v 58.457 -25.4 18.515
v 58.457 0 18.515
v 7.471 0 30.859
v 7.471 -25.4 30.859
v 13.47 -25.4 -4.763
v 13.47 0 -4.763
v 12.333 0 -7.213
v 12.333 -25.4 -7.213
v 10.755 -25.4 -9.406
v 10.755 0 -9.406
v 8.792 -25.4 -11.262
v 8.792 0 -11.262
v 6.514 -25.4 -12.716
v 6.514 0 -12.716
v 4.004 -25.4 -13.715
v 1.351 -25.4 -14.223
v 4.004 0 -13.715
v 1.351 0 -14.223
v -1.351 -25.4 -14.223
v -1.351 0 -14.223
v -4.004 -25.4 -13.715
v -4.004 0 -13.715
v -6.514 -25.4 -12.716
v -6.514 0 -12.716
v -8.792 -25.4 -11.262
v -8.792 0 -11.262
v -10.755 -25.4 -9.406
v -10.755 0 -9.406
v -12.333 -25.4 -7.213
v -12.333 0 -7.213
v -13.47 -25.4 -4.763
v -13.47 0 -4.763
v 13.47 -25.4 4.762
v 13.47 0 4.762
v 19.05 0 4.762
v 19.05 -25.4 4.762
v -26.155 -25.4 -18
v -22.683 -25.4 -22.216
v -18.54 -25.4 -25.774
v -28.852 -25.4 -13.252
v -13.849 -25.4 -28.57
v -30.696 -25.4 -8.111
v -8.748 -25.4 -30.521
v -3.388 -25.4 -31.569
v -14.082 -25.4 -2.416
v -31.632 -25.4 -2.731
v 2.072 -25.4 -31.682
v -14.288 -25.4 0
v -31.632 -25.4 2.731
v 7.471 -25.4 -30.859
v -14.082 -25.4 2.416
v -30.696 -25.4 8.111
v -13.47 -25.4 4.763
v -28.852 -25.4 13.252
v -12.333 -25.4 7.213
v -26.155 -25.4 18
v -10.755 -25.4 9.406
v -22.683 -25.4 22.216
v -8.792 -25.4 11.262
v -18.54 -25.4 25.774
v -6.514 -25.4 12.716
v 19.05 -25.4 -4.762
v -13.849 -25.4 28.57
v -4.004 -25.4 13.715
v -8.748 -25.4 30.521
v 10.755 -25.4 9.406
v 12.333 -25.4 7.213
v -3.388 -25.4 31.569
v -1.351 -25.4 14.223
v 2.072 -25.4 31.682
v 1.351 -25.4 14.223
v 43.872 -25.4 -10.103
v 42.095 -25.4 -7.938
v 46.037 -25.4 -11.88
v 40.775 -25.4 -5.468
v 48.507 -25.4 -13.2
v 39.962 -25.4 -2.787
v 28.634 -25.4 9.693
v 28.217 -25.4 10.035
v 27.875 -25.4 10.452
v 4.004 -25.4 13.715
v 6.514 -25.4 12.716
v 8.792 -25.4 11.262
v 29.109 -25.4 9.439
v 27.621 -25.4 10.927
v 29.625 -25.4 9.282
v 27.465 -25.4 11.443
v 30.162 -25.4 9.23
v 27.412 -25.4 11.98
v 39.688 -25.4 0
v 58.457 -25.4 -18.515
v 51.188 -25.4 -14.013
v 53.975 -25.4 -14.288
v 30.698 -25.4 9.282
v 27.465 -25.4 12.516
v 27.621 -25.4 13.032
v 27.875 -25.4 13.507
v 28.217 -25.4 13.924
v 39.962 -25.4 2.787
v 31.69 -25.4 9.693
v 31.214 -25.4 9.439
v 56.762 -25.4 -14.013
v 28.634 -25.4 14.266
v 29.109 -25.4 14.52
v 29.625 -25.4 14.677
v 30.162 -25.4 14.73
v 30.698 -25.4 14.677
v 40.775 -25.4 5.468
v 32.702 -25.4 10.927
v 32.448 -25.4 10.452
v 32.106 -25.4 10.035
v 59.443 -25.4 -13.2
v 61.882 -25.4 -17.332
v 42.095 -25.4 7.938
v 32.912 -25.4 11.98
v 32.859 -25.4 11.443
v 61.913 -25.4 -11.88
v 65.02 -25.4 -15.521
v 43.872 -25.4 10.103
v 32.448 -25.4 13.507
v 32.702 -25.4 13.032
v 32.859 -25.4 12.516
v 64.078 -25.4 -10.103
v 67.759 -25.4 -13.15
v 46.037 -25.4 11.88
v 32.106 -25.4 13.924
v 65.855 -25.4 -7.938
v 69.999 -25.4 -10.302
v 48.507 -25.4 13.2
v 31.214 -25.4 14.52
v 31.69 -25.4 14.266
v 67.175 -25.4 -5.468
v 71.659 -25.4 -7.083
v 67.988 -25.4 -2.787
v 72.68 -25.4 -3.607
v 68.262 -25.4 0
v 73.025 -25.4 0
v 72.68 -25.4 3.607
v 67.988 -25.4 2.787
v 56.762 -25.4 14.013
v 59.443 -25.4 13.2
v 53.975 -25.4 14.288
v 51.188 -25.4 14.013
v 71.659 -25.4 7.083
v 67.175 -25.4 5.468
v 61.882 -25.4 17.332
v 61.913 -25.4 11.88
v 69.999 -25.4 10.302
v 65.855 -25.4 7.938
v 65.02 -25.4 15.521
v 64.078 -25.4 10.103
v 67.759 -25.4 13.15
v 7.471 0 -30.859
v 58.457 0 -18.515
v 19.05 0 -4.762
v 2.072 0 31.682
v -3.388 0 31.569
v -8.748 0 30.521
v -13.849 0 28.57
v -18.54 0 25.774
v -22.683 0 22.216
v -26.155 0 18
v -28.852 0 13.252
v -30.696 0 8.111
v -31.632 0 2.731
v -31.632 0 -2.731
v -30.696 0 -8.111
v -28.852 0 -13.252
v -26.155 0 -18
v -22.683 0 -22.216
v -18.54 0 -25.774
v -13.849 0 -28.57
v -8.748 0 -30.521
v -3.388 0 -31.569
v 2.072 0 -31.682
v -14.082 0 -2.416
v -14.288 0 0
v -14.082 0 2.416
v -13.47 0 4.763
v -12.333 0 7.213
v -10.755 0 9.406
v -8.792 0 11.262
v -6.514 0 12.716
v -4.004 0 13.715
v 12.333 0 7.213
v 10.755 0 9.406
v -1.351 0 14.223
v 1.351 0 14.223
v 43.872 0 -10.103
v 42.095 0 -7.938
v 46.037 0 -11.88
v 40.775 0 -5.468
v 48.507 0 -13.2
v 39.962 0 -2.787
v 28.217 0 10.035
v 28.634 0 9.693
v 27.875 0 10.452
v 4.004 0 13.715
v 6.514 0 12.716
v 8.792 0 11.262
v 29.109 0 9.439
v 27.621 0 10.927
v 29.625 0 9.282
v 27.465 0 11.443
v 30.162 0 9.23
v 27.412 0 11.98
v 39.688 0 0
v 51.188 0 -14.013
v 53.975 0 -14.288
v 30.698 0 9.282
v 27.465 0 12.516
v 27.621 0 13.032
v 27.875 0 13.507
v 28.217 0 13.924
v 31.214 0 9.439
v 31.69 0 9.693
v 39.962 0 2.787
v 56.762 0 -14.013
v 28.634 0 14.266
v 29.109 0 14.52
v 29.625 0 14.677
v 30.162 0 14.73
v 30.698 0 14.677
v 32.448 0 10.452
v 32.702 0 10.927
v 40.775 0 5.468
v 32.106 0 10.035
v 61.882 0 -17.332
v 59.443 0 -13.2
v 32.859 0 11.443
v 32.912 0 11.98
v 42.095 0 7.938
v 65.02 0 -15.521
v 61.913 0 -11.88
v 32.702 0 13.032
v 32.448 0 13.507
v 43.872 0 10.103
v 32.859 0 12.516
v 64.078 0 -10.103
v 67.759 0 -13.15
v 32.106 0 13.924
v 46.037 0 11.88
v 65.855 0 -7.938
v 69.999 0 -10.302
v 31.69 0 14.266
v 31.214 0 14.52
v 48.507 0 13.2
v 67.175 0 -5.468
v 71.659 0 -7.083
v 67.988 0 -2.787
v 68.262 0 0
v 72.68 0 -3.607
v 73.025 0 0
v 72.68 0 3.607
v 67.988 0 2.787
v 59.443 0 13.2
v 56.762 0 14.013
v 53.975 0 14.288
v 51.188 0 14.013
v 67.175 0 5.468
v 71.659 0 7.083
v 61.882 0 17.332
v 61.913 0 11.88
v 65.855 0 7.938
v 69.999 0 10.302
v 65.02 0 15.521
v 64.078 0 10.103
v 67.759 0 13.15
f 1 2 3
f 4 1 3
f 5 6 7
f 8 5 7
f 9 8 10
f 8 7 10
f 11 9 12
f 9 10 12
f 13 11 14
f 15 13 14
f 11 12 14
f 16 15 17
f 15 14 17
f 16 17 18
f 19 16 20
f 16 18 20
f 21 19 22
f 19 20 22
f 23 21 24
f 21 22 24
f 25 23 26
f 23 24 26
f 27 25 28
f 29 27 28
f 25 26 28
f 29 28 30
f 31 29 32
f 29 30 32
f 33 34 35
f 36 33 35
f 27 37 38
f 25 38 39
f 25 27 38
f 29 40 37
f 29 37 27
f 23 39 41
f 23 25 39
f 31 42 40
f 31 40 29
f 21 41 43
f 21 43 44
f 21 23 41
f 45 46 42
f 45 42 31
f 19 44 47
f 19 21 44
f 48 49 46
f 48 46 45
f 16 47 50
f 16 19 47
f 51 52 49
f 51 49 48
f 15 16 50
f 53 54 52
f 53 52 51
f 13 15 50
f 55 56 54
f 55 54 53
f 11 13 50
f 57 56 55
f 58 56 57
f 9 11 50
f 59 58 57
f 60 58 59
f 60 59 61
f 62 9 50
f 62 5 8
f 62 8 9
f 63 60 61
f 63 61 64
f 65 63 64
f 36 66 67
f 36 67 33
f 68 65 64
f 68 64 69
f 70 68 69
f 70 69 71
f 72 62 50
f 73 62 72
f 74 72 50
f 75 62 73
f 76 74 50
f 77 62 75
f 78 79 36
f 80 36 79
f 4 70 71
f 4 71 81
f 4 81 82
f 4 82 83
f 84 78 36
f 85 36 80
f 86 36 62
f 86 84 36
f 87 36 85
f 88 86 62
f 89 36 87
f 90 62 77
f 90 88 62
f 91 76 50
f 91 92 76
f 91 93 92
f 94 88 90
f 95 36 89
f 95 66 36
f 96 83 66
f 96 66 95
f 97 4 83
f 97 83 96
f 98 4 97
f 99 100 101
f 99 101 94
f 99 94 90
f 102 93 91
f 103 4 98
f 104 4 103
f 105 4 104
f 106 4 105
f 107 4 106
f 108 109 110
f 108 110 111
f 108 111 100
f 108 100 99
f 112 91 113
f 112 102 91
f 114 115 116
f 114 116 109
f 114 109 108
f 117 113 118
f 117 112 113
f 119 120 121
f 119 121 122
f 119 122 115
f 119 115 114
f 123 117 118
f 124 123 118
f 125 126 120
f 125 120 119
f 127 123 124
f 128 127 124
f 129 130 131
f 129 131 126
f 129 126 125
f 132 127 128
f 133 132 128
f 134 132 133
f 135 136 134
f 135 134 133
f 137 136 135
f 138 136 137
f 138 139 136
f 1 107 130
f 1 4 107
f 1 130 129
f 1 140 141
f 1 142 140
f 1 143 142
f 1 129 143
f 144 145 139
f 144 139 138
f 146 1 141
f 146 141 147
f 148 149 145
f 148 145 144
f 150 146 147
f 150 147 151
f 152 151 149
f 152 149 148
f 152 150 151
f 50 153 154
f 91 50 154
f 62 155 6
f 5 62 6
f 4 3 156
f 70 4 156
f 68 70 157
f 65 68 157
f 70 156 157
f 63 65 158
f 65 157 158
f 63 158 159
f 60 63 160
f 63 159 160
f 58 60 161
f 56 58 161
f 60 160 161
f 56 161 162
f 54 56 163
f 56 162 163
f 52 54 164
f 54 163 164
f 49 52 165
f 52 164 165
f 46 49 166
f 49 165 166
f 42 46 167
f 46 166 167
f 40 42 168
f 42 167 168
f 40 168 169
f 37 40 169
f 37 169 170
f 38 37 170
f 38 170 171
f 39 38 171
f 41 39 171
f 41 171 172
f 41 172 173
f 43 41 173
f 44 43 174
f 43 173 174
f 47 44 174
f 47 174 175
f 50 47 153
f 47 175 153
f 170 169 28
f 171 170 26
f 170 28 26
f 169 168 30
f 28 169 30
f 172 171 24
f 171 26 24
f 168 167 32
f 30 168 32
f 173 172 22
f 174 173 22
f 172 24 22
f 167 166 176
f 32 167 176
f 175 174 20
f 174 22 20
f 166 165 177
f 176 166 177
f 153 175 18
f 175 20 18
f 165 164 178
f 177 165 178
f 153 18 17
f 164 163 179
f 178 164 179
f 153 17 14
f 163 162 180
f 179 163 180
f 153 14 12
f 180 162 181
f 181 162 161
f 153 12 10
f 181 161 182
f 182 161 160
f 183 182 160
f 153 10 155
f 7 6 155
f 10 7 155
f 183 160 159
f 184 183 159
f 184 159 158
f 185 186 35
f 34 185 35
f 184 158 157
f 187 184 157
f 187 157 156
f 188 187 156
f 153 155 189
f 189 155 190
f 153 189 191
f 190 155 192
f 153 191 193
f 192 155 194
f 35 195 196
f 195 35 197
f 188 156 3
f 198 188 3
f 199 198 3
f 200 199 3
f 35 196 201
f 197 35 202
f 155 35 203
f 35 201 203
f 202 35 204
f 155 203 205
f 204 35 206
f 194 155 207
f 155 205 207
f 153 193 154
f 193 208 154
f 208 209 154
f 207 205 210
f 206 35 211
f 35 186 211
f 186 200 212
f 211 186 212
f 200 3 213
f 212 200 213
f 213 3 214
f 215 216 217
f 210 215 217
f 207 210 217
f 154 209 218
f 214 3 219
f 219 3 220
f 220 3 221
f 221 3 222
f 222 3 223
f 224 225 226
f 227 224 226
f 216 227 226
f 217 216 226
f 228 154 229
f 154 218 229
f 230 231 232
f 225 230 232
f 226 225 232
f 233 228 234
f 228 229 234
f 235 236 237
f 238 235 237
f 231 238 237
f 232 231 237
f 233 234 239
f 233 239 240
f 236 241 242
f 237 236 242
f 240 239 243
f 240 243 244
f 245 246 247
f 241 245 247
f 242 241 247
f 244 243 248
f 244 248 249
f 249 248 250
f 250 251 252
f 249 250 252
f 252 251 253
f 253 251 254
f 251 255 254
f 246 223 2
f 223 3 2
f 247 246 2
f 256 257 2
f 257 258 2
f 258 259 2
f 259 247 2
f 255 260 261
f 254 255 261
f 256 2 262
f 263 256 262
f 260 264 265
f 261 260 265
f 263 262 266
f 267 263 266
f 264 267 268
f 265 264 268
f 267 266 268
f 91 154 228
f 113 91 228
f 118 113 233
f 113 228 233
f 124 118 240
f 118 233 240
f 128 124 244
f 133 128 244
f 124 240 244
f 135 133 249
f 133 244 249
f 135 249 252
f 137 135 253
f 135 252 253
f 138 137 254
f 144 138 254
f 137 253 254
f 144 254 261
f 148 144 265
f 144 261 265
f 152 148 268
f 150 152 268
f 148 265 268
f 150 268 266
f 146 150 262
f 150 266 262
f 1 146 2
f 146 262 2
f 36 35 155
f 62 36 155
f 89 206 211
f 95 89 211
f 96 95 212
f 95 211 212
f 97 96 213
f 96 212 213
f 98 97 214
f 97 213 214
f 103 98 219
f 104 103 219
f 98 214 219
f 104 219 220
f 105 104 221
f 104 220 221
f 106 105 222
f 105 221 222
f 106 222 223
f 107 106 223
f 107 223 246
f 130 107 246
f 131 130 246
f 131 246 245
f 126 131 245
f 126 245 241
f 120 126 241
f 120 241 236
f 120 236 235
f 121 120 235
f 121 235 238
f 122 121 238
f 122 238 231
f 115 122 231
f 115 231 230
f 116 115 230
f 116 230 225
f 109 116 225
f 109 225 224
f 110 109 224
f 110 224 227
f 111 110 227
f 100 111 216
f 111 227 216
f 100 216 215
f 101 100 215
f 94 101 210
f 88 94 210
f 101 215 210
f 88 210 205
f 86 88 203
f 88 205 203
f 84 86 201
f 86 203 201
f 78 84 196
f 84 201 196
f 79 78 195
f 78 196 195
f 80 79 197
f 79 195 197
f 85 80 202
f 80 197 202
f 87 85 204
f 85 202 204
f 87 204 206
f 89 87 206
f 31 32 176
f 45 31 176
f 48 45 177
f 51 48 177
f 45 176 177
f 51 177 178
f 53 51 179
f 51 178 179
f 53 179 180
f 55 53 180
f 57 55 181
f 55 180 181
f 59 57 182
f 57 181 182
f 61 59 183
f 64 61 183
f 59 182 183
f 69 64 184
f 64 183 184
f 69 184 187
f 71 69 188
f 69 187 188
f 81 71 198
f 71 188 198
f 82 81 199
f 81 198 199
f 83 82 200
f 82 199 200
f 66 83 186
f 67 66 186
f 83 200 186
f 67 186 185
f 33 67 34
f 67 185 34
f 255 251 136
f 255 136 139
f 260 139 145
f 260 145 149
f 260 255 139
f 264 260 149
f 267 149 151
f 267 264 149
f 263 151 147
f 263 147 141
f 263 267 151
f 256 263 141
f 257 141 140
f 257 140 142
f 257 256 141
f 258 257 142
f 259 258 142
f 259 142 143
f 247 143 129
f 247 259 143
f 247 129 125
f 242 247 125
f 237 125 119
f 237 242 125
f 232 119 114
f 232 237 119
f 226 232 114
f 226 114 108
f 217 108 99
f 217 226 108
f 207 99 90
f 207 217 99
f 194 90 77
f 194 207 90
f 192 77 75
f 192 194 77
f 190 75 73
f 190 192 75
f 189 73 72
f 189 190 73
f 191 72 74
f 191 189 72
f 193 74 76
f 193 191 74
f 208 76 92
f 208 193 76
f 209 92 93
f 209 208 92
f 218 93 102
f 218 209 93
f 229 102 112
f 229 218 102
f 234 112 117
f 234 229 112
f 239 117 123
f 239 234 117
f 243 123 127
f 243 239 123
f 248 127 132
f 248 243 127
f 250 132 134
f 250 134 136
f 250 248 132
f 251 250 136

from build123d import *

# Parameters (mm, degrees)
F0_R     = 14.2875
F1_DEPTH = 25.4
F3_D     = 5.5


with BuildPart() as f1:
    # F0 (on Front) → F1 (new body)
    with BuildSketch(Plane.XZ):
        with BuildLine():
            ThreePointArc((7.4705882353, -30.8585938017), (24.9524916238, -19.6325154212), (31.75, 0))
            ThreePointArc((31.75, 0), (24.9524916238, 19.6325154212), (7.4705882353, 30.8585938017))
            ThreePointArc((7.4705882353, 30.8585938017), (-31.75, 0), (7.4705882353, -30.8585938017))
        make_face()
        with BuildLine():
            ThreePointArc((-13.4703841816, 4.7625), (0, 14.2875), (13.4703841816, 4.7625))
            Line((13.4703841816, 4.7625), (19.05, 4.7625))
            Line((19.05, 4.7625), (19.05, -4.7625))
            Line((19.05, -4.7625), (13.4703841816, -4.7625))
            ThreePointArc((13.4703841816, -4.7625), (0, -14.2875), (-13.4703841816, -4.7625))
            Line((-13.4703841816, -4.7625), (-19.05, -4.7625))
            Line((-19.05, -4.7625), (-19.05, 4.7625))
            Line((-19.05, 4.7625), (-13.4703841816, 4.7625))
        make_face(mode=Mode.SUBTRACT)
        with BuildLine():
            ThreePointArc((-13.4703841816, -4.7625), (-14.2875, 0), (-13.4703841816, 4.7625))
            Line((-13.4703841816, 4.7625), (-19.05, 4.7625))
            Line((-19.05, 4.7625), (-19.05, -4.7625))
            Line((-19.05, -4.7625), (-13.4703841816, -4.7625))
        make_face()
        with BuildLine():
            ThreePointArc((7.4705882353, 30.8585938017), (24.9524916238, 19.6325154212), (31.75, 0))
            ThreePointArc((31.75, 0), (24.9524916238, -19.6325154212), (7.4705882353, -30.8585938017))
            Line((7.4705882353, -30.8585938017), (58.4573529412, -18.515156281))
            ThreePointArc((58.4573529412, -18.515156281), (34.925, 0), (58.4573529412, 18.515156281))
            Line((58.4573529412, 18.515156281), (7.4705882353, 30.8585938017))
        make_face()
        with BuildLine():
            ThreePointArc((73.025, 0), (68.9464949743, 11.7795092527), (58.4573529412, 18.515156281))
            ThreePointArc((58.4573529412, 18.515156281), (34.925, 0), (58.4573529412, -18.515156281))
            ThreePointArc((58.4573529412, -18.515156281), (68.9464949743, -11.7795092527), (73.025, 0))
        make_face()
        with Locations((53.975, 0)):
            Circle(F0_R, mode=Mode.SUBTRACT)
    extrude(amount=F1_DEPTH)

    # F3 (through all)
    with Locations(Plane.XZ.offset(25.4)):
        with Locations((30.1617980003, 11.9795044884)):
            Hole(F3_D / 2)


solid = f1.part
